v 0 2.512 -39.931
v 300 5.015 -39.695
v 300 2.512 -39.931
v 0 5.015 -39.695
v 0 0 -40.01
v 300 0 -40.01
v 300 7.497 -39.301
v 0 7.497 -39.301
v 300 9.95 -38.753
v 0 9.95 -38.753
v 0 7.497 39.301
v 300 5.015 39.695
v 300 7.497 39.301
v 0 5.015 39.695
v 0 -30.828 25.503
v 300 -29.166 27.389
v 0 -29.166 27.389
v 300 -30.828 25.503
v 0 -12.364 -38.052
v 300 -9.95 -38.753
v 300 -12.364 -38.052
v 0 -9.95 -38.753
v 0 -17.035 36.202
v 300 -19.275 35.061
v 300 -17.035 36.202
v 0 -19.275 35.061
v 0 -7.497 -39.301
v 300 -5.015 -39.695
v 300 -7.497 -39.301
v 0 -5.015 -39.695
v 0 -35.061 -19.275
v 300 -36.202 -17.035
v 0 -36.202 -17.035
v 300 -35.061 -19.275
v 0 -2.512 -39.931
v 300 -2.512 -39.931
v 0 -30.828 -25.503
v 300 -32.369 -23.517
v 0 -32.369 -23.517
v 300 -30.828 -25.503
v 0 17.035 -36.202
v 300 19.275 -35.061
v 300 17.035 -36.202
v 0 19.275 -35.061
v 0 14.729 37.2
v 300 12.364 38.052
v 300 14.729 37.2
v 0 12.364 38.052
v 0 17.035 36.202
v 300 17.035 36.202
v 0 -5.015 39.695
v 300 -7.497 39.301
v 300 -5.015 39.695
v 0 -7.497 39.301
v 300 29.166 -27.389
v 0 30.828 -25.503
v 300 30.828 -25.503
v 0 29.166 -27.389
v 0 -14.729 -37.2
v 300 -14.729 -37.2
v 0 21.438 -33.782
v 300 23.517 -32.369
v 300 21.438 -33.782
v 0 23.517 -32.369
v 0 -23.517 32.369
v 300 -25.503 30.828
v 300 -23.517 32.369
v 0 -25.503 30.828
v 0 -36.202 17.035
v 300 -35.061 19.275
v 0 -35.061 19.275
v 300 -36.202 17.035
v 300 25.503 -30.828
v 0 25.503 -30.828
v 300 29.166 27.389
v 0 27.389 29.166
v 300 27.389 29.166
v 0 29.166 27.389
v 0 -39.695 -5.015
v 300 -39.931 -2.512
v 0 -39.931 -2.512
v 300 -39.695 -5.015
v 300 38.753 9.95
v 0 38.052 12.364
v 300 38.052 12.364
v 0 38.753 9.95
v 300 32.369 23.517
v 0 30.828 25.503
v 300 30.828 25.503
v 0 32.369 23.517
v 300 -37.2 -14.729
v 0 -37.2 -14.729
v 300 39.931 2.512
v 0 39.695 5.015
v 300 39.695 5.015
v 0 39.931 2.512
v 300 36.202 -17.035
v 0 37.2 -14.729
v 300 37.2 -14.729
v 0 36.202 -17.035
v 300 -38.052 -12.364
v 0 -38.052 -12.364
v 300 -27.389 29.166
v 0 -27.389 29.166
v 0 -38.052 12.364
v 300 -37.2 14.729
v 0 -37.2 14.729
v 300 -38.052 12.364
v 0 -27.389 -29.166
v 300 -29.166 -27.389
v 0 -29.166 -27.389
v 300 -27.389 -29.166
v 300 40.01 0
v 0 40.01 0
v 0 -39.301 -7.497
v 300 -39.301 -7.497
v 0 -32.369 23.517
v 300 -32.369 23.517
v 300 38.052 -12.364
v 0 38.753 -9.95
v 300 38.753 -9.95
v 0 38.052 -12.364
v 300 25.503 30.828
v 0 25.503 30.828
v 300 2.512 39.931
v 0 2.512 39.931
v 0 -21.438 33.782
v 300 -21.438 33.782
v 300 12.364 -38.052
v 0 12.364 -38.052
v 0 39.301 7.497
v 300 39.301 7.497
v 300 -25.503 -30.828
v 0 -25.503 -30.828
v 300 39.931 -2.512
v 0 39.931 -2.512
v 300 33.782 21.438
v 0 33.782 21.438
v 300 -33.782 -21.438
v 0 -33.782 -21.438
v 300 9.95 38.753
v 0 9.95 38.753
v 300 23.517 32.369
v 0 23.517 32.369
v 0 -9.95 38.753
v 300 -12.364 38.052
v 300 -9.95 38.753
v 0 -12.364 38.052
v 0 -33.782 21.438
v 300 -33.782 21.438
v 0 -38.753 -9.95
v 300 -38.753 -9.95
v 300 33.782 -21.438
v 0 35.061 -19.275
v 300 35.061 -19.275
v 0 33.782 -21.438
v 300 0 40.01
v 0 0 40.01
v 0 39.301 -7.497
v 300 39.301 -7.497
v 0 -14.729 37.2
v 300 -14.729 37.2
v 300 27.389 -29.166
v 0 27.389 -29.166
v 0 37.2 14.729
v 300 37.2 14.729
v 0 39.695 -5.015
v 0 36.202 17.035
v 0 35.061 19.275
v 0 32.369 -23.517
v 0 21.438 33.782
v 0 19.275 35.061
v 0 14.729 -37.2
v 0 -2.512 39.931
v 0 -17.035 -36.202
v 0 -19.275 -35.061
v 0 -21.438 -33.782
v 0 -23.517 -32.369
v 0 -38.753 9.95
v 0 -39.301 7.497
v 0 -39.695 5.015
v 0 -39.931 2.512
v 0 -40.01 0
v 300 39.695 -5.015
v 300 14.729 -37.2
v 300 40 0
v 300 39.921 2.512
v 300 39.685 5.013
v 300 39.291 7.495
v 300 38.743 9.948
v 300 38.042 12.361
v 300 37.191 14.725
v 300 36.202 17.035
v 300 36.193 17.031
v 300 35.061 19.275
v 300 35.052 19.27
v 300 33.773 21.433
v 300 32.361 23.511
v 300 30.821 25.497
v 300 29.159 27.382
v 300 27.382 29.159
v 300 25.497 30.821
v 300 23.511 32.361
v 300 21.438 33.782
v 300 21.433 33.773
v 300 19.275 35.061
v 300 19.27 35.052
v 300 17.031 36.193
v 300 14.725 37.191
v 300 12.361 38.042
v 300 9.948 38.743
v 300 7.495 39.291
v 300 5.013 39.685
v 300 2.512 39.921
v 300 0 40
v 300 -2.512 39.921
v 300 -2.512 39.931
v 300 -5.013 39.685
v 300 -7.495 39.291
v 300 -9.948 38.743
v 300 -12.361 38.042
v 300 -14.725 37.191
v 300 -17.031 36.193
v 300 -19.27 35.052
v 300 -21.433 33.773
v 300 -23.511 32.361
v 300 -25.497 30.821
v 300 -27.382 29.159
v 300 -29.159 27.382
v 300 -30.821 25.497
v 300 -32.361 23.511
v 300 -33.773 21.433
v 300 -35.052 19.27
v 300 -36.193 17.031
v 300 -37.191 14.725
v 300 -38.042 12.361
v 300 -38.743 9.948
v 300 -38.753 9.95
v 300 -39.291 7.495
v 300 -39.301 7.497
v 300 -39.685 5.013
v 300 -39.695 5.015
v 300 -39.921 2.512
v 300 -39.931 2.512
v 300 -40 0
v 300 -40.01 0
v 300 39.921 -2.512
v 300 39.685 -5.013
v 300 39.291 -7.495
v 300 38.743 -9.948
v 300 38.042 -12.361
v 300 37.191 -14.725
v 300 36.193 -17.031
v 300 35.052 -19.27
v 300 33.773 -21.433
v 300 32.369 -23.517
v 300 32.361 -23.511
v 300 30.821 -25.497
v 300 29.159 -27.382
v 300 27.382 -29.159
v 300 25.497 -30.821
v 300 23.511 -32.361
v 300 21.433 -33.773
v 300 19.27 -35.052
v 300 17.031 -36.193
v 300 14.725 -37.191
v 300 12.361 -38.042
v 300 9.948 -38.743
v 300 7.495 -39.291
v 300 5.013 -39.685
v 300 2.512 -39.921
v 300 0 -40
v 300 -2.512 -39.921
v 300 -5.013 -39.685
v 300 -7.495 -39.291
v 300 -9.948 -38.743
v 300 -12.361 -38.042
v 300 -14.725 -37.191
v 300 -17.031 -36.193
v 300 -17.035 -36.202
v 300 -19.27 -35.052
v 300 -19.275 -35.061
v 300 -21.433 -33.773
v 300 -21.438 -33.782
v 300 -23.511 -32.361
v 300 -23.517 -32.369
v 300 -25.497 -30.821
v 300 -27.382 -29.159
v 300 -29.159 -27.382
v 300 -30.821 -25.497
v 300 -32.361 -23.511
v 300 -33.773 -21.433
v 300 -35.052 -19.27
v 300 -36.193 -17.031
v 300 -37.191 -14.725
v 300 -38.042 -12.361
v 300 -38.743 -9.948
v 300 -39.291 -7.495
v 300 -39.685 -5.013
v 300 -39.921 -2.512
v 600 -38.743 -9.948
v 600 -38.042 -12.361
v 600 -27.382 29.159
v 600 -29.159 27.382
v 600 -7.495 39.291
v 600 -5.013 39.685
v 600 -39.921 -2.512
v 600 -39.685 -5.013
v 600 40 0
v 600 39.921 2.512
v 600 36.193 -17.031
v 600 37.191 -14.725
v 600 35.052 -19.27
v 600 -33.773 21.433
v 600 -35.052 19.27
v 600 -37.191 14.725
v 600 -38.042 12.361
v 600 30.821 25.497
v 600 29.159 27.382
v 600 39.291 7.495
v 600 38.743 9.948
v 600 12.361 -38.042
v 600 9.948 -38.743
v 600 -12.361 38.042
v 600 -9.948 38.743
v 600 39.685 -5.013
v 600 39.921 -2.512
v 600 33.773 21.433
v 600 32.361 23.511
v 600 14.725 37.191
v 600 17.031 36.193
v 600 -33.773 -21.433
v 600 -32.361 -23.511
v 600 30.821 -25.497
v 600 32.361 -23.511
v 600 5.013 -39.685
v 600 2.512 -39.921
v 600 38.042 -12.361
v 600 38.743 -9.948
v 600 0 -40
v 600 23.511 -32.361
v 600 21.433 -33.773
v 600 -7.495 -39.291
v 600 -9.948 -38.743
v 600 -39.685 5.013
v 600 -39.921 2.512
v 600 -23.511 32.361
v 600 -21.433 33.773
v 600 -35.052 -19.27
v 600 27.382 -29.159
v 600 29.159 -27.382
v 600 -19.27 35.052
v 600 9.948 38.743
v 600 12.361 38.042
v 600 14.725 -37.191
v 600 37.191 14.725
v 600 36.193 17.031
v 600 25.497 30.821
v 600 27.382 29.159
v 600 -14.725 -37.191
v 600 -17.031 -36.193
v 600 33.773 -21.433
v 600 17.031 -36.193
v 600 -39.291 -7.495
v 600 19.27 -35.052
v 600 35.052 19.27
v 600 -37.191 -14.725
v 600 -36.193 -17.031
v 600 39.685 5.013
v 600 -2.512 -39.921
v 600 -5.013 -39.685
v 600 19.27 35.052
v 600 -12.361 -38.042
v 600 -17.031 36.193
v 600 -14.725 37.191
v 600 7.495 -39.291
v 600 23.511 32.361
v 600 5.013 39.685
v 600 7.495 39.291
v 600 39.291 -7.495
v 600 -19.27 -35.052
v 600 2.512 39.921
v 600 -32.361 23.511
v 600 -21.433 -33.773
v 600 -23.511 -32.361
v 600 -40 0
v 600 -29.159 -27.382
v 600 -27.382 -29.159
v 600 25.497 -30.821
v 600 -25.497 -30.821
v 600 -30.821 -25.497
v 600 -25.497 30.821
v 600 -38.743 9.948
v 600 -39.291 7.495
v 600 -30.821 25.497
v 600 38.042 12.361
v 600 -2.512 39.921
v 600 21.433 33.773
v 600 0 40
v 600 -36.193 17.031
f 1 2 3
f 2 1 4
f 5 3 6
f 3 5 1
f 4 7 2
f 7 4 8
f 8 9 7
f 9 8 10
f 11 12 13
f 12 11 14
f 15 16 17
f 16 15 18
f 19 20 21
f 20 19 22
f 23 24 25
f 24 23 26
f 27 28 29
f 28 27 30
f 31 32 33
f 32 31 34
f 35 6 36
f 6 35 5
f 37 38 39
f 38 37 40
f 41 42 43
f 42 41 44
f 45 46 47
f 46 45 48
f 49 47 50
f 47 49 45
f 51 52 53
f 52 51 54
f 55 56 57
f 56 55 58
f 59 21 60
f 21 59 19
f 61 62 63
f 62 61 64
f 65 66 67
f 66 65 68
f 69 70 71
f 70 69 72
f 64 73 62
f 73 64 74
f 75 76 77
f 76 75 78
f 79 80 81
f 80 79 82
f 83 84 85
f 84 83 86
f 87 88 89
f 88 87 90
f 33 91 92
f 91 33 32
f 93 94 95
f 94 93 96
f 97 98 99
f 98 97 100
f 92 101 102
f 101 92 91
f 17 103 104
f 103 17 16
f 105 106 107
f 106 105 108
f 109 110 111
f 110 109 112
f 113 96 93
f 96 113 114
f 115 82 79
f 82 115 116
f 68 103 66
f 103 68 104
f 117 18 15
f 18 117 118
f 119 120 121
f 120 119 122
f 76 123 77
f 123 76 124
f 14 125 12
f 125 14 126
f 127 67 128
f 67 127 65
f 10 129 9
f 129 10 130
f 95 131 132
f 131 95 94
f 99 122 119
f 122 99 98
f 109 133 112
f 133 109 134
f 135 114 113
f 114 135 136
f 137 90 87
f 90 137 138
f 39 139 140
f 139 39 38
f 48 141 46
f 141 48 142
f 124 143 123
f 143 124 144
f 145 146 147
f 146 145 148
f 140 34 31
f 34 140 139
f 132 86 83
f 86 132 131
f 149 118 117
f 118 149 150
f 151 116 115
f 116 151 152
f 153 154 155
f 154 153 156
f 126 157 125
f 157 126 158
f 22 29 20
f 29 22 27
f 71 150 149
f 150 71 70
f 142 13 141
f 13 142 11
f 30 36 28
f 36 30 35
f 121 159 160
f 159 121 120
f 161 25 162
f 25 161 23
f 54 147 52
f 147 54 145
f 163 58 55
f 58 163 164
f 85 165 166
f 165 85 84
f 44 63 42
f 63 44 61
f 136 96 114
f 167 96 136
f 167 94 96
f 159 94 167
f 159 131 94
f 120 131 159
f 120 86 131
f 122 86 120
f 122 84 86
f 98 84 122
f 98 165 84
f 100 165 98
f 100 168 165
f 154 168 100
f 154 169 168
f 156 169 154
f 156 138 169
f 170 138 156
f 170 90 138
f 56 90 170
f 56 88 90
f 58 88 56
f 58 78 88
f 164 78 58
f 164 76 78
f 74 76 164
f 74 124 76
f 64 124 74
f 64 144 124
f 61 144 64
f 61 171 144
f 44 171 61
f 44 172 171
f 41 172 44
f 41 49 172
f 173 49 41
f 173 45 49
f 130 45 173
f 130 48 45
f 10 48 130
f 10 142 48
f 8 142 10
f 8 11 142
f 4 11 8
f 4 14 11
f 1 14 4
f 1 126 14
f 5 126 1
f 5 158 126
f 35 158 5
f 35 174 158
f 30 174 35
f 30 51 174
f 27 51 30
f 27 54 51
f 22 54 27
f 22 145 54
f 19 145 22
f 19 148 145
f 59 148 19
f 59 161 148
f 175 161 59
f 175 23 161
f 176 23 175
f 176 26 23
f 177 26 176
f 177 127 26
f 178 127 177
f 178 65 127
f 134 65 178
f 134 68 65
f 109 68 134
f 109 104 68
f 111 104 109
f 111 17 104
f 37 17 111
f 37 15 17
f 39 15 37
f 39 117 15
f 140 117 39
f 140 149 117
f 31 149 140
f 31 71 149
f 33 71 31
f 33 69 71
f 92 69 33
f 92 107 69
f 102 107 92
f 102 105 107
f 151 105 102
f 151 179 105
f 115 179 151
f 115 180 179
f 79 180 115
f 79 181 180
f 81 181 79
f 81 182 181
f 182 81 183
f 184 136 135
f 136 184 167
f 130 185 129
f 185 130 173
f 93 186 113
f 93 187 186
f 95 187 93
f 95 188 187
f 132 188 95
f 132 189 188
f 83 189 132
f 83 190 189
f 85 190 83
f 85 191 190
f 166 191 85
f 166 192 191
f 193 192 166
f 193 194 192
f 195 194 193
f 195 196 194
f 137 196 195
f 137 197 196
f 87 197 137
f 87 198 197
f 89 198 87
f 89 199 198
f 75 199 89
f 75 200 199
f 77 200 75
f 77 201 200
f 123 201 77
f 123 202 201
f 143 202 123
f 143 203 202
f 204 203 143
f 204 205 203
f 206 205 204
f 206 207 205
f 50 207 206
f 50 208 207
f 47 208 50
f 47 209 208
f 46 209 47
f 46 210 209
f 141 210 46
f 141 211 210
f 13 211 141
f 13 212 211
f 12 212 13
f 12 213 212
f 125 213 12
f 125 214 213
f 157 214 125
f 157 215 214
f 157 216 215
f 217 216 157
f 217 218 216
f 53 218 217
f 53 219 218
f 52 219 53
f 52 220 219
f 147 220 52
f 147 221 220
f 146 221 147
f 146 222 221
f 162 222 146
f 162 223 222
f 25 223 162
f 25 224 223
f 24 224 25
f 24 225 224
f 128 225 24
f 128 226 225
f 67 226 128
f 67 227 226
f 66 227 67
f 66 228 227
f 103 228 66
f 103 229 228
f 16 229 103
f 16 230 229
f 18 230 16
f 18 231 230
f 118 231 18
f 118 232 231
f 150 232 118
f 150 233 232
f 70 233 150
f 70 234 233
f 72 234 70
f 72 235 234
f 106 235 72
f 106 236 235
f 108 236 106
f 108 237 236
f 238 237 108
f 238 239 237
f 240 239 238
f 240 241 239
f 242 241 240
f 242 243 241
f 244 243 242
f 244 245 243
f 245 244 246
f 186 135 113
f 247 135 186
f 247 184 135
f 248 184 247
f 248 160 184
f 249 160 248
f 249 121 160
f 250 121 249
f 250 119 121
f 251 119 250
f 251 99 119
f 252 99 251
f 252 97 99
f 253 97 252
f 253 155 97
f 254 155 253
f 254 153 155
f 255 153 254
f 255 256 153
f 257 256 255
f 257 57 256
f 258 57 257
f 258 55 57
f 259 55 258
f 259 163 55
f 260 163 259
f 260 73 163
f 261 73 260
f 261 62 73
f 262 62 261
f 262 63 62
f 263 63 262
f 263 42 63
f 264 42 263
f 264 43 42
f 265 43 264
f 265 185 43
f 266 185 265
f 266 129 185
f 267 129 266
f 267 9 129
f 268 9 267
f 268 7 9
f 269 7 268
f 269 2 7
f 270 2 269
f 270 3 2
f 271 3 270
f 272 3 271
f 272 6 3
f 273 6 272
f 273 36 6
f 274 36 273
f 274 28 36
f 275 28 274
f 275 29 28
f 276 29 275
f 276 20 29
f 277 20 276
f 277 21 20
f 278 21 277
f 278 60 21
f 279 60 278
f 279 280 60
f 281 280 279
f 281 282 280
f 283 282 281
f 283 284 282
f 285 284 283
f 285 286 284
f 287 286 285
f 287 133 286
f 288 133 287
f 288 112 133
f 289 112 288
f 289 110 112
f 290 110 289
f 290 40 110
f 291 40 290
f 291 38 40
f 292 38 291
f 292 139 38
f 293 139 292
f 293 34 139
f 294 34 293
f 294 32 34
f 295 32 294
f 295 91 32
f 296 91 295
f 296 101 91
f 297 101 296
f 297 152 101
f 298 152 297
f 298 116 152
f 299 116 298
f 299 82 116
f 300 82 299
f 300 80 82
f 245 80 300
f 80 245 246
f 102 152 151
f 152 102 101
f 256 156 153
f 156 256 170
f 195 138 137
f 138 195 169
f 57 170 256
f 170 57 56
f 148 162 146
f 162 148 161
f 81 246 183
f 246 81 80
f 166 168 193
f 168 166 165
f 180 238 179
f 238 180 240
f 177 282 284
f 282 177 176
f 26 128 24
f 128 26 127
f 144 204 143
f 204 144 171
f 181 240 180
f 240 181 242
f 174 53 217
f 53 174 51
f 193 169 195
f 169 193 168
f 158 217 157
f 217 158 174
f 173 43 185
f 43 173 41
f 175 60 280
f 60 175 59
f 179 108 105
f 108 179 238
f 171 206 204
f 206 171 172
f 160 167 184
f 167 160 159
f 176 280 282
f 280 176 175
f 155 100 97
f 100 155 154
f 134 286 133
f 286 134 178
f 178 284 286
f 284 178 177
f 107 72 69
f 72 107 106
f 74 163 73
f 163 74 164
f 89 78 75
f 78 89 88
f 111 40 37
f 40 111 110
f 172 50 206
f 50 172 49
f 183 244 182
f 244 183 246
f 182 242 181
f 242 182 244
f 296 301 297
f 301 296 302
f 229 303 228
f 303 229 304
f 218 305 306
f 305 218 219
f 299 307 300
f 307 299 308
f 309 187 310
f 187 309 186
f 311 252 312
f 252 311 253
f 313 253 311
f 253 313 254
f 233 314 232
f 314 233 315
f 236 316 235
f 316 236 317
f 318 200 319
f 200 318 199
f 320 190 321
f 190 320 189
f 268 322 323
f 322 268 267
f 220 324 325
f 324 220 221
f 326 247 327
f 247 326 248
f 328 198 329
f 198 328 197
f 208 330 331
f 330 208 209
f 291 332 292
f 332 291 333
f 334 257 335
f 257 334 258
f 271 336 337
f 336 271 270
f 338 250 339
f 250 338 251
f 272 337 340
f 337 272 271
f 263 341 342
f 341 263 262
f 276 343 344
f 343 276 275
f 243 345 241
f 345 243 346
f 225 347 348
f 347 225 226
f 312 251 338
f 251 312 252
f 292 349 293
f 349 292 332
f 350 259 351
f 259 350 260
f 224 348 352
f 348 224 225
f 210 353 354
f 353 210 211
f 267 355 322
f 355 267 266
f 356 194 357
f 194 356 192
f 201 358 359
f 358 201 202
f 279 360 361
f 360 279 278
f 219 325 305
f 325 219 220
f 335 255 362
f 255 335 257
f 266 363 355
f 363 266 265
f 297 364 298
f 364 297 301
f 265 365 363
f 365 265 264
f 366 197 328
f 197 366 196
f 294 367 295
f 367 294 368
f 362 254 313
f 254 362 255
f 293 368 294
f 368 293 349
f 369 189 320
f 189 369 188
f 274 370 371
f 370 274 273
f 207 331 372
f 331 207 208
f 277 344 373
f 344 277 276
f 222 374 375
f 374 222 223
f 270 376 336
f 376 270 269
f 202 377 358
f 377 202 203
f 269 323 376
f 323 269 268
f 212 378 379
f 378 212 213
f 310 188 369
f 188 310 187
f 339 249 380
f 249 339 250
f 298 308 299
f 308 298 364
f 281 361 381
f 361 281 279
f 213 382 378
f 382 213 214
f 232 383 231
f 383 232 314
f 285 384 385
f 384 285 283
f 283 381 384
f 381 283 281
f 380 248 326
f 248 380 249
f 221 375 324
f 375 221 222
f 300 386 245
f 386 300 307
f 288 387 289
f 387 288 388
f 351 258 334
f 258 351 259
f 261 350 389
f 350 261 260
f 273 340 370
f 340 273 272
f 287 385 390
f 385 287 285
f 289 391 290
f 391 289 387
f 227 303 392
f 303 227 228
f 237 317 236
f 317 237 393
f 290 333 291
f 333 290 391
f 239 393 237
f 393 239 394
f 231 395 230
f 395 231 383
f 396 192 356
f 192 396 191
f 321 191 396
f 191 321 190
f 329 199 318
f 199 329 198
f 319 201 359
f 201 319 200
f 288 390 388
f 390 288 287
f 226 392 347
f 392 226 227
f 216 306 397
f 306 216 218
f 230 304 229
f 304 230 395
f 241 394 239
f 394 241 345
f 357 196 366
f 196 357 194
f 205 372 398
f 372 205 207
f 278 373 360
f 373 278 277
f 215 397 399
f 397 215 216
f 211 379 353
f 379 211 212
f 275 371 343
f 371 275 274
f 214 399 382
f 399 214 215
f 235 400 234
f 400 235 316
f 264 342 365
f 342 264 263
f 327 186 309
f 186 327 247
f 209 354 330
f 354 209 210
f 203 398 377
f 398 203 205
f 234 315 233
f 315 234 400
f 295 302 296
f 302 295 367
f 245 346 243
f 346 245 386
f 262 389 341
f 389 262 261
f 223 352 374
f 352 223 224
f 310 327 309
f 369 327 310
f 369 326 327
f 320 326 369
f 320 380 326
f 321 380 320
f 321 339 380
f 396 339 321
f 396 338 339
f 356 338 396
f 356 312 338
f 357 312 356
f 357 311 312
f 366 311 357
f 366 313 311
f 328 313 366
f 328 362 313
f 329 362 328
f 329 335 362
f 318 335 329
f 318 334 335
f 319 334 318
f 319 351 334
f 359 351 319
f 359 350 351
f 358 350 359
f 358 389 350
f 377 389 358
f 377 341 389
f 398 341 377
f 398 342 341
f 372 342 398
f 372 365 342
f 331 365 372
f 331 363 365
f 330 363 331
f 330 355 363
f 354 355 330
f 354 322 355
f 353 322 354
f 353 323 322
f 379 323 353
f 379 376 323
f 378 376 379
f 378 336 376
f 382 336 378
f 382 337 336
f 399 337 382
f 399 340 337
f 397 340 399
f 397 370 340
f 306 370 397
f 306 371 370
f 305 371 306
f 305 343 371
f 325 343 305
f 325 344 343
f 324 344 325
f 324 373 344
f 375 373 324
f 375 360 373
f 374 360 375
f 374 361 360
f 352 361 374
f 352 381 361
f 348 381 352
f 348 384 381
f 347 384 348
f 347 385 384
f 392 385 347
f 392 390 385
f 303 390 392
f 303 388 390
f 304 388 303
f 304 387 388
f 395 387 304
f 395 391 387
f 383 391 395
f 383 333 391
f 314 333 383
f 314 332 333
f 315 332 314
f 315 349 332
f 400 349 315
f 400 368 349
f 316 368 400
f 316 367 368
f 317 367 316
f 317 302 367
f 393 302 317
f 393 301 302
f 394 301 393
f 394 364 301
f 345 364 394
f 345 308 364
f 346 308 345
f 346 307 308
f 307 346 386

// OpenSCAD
scale       = 100;
lMacro      = 6*scale;
rMacro      = 0.4*scale;
macroContacts = [0,1,0,1,0,1,0,0,1,0,1];
lMacroPlot  = 3*scale;
lMicro      = 2*scale;
rMicro      = 0.07*scale;
rMicroContact = 0.02*scale;
angleMicroY = 30;
microColor          = (1/255)*[185,162,144];
macroPlotColor      = (1/255)*[78,80,83];
macroNoPlotColor    = (1/255)*[238,225,213];
microContactColor   = (1/255)*[226,226,226];



//module drawTetrode(){
//    difference(){
//        color(microColor)
//        cylinder(h=lMicro+rMicro,r1=rMicro,r2=rMicro,center=false,$fn=100);
//        translate([0,0,lMicro+rMicro]){
//            rotate([0,-60,0]){
//                cube(size=[10*rMicro,10*rMicro,1.75*rMicro],center=true);
//            }
//        }
//    }
//    difference(){
//    for (angleMicroContact = [45,135,225,315]){
//        rotate([0,0,angleMicroContact]){
//            translate([0.035*scale,0,0]){
//                color([1,1,1])
//                cylinder(h=lMicro+rMicro+0.01,r1=rMicroContact,r2=rMicroContact,center=false,$fn=100);
//            }
//        }
//    }
//    translate([0,0,lMicro+rMicro+2]){
//        rotate([0,-60,0]){
//            cube(size=[5*rMicro,5*rMicro,1.4*rMicro],center=true);
//            }
//        }
//    }
//}

//drawTetrode();
i = 0;

rotate([0,90,0]){
    for (ismacro = macroContacts){ 
//        echo(ismacro)
        translate([i*lMacroPlot,0,0]);
        if (ismacro==1){
            color(macroPlotColor);
            cylinder(h=lMacro,r1=rMacro,r2=rMacro,center=false,$fn=100);
        }            
        else{
            color(macroNoPlotColor);
            cylinder(h=lMacroPlot,r1=rMacro+0.01,r2=rMacro+0.01,center=false,$fn=100);
        }
        i=i+1;
    }

}
//translate([lMacro/2,0,0]){
//    color(macroPlotColor)
//    sphere(r=rMacro,$fn=100);
//}
//translate([-lMacro/2,0,0]){
//    rotate([-180,90,0])
//    color(macroNoPlotColor)
//    cylinder(h=lMacroPlot/2,r1=rMacro,r2=rMacro,center=false);
//}
//
//for (angleMicroX = [0,120,240]){
//    rotate([angleMicroX,0,0])
//    translate([0,0,rMacro-rMicro])
//    rotate([0,90-angleMicroY,0]){
//        difference(){
//            drawTetrode();
//        }
//    }
//                
//}
